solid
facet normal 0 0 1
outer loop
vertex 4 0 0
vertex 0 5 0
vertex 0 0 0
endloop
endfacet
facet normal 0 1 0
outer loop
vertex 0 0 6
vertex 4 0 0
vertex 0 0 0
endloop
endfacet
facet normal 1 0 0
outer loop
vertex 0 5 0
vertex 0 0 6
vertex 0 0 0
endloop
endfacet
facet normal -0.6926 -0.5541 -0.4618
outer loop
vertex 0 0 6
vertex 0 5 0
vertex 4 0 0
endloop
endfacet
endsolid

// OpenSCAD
polyhedron(
  points = [[0, 0, 0], [4, 0, 0], [0, 5, 0], [0, 0, 6]],
  faces  = [[0, 2, 1], [0, 1, 3], [0, 3, 2], [1, 2, 3]]
);
